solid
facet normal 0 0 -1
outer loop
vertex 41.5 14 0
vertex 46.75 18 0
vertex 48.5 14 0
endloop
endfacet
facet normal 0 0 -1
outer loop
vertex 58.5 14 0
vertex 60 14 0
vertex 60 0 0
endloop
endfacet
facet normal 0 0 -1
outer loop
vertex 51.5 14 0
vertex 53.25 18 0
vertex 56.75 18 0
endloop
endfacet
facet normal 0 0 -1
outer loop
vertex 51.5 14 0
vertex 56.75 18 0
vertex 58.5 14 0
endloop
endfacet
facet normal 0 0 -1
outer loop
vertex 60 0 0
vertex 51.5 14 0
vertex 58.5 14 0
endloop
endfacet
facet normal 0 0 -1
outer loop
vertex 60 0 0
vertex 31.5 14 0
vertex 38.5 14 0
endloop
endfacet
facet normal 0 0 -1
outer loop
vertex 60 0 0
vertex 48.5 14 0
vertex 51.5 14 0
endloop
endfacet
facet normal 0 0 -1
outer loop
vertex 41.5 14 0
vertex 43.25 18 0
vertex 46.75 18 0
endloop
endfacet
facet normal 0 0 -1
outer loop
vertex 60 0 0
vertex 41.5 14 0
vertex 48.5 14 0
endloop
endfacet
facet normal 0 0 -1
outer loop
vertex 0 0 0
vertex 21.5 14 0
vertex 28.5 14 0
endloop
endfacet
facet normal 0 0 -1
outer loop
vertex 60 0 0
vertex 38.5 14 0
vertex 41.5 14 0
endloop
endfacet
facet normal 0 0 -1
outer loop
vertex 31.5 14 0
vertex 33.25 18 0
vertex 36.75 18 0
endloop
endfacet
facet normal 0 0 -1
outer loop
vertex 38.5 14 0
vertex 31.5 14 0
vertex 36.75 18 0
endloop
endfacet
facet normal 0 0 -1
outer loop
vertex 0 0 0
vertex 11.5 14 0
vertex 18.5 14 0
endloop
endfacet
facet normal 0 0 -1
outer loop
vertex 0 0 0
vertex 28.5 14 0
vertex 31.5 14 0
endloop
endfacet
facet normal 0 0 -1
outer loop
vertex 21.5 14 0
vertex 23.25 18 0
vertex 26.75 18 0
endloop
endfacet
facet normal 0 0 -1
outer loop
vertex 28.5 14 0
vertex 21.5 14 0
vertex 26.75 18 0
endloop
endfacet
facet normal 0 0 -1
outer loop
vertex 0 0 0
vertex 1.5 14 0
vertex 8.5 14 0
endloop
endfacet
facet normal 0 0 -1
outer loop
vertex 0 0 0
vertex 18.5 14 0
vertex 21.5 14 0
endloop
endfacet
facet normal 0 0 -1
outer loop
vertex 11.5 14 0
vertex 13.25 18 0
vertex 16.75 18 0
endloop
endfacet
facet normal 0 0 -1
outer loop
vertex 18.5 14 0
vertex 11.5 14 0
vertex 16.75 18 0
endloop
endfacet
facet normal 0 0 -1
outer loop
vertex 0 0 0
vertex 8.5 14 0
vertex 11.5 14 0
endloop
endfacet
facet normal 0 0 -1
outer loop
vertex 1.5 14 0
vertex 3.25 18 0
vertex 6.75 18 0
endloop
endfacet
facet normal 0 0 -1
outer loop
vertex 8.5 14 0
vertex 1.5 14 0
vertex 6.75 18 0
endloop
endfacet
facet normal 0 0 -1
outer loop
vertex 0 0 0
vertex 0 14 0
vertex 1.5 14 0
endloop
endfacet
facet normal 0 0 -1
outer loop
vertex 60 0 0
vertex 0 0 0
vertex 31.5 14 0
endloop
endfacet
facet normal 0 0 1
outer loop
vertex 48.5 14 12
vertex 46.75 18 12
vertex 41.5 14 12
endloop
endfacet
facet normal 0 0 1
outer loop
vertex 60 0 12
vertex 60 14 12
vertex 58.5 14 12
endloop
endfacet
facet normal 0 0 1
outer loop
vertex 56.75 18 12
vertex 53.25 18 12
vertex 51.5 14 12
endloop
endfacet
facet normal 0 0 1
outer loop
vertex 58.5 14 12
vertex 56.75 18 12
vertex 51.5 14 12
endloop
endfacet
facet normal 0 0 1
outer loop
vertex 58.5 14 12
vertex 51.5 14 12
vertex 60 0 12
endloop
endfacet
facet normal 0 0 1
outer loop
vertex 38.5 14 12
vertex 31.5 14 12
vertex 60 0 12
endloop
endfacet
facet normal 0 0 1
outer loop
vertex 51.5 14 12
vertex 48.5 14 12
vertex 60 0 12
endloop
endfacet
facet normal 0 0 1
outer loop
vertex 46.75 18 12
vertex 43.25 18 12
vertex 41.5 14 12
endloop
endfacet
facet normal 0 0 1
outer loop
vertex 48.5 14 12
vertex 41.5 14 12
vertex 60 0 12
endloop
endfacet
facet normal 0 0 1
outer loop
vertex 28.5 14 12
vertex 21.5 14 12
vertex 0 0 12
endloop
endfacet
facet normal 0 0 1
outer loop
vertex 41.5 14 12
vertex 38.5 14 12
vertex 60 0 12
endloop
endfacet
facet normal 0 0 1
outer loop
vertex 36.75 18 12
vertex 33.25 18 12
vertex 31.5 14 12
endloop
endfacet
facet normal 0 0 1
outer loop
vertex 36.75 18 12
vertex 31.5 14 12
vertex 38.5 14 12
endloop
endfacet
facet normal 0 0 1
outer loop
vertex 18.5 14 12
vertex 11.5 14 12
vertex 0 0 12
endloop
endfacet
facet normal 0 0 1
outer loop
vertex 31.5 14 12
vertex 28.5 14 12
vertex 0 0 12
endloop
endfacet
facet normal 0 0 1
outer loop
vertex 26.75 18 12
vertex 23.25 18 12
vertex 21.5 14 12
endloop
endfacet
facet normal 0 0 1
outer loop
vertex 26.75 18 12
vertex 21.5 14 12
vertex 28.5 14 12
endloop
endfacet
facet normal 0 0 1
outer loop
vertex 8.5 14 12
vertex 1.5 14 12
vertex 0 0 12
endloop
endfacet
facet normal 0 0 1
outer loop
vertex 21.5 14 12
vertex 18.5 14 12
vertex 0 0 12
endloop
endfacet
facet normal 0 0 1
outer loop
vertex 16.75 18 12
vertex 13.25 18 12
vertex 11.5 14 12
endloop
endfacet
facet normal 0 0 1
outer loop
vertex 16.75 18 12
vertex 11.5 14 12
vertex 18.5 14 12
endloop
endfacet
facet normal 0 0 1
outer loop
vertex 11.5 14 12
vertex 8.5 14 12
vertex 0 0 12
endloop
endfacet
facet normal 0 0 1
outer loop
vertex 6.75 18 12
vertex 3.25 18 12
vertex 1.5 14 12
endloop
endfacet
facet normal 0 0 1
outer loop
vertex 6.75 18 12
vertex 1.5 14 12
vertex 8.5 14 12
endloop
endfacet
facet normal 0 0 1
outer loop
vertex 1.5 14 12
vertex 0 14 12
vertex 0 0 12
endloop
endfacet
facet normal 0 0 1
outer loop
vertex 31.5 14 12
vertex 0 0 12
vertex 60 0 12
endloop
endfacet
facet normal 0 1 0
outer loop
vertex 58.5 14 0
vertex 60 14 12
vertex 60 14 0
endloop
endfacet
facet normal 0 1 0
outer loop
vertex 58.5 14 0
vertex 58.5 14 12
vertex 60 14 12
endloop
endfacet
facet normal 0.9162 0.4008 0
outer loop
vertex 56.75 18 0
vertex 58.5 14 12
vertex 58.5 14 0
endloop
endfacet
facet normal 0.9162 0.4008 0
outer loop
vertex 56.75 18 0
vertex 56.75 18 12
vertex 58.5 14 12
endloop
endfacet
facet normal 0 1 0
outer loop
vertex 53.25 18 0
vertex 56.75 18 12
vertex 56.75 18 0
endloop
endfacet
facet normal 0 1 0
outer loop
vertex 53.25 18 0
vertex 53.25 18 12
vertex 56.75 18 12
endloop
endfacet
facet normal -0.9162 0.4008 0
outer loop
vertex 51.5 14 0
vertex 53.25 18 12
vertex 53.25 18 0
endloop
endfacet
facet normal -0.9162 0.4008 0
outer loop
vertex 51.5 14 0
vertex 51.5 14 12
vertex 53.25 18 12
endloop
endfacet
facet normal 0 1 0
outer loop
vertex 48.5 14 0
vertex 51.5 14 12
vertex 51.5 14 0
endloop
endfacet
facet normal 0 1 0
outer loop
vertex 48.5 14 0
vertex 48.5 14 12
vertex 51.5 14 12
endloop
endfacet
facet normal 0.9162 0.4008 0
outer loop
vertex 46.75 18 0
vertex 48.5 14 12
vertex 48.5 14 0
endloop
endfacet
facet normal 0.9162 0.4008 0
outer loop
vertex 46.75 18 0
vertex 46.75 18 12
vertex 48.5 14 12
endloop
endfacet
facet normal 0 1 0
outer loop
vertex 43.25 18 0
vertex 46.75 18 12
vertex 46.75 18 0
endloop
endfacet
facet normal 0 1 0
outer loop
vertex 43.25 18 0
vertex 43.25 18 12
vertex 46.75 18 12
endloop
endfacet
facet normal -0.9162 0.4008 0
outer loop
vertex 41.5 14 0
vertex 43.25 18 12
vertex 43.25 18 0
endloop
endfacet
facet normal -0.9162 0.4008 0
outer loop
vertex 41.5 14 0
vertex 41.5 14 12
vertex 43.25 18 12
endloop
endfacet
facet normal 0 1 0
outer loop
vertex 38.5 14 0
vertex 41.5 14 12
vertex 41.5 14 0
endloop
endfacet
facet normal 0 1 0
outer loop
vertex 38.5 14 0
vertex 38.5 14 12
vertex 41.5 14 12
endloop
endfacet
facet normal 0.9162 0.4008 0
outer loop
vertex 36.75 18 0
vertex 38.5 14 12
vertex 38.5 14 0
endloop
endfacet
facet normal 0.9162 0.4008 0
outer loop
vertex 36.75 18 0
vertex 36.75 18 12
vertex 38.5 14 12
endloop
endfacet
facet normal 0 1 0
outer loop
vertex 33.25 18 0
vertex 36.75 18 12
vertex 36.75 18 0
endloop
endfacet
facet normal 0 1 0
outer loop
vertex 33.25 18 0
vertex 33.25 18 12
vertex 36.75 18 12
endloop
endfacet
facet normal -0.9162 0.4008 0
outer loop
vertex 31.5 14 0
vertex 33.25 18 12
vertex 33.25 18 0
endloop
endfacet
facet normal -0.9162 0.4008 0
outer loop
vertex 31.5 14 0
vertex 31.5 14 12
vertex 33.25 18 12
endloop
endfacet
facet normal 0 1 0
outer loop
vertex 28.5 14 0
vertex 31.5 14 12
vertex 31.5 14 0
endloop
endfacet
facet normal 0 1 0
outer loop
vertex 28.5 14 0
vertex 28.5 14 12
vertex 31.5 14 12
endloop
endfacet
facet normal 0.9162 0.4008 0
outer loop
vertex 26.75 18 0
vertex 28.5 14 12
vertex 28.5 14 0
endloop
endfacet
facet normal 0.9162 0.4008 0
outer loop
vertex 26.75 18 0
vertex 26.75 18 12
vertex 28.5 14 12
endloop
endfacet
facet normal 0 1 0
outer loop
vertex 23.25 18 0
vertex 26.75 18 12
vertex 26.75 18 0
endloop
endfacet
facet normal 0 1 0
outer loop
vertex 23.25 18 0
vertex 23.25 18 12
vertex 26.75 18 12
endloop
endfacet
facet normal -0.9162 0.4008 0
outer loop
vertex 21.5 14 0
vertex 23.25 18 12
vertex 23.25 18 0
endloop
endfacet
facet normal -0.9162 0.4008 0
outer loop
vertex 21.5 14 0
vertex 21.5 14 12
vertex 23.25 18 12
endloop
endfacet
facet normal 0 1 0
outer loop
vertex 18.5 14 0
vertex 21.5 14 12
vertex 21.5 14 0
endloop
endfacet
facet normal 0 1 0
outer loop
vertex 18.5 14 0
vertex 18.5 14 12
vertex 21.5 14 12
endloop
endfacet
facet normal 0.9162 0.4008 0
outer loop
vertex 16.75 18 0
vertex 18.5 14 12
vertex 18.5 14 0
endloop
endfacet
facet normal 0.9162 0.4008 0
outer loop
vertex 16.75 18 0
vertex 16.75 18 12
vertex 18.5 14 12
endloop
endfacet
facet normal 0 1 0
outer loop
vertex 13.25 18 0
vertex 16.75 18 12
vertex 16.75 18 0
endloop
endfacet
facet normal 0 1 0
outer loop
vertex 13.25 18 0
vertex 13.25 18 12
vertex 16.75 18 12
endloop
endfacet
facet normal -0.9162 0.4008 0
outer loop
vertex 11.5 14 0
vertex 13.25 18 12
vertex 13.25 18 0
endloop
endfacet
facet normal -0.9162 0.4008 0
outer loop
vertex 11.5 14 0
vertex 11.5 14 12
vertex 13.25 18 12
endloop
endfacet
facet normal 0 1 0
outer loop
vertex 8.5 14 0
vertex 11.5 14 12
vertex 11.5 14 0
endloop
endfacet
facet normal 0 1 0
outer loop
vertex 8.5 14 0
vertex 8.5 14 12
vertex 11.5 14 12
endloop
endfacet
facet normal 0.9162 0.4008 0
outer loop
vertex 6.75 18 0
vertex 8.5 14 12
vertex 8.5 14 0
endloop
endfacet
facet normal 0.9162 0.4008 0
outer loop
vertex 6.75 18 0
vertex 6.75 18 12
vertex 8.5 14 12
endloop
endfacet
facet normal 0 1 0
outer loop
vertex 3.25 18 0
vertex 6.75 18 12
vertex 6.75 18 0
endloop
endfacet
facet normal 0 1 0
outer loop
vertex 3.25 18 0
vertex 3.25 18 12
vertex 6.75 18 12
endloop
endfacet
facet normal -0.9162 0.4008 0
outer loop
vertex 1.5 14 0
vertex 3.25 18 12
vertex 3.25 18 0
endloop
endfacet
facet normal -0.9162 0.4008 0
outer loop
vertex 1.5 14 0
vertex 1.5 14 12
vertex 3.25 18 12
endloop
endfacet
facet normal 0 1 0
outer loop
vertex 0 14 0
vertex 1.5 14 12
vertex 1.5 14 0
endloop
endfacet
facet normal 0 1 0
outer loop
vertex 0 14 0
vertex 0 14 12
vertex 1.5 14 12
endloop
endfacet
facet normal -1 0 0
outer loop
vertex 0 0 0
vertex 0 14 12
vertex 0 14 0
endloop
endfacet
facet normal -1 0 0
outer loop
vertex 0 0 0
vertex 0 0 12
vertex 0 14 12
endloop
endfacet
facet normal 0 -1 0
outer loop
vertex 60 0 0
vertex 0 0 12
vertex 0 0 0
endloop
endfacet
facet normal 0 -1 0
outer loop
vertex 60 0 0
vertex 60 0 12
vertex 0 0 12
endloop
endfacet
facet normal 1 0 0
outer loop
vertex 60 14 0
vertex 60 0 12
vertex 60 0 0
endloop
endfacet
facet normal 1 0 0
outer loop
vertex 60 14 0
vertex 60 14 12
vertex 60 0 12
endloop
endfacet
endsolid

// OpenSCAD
$fn = 32;

// ----------------------------------------------------------------------
// Gear rack: 6 teeth, pitch 10 mm
// ----------------------------------------------------------------------

// --- parameters (mm) ---
teeth = 6;                // number of teeth
pitch = 10;               // tooth pitch, X
root_w = 7;               // tooth width at the root
tip_w = 3.5;              // tooth width at the tip
base_h = 14;              // rack body height, Y
tooth_h = 4;              // tooth height above the body
plate_t = 12;             // rack width, Z (extrusion height)

rack_l = teeth * pitch;  // overall length
total_h = base_h + tooth_h;  // overall height

profile = [[0, 0], [60, 0], [60, 14], [58.5, 14], [56.75, 18], [53.25, 18], [51.5, 14], [48.5, 14], [46.75, 18], [43.25, 18], [41.5, 14], [38.5, 14], [36.75, 18], [33.25, 18], [31.5, 14], [28.5, 14], [26.75, 18], [23.25, 18], [21.5, 14], [18.5, 14], [16.75, 18], [13.25, 18], [11.5, 14], [8.5, 14], [6.75, 18], [3.25, 18], [1.5, 14], [0, 14]];  // primary outline, 28 points, counter clockwise

// --- the one profile operation ---
linear_extrude(height = plate_t) polygon(points = profile);
